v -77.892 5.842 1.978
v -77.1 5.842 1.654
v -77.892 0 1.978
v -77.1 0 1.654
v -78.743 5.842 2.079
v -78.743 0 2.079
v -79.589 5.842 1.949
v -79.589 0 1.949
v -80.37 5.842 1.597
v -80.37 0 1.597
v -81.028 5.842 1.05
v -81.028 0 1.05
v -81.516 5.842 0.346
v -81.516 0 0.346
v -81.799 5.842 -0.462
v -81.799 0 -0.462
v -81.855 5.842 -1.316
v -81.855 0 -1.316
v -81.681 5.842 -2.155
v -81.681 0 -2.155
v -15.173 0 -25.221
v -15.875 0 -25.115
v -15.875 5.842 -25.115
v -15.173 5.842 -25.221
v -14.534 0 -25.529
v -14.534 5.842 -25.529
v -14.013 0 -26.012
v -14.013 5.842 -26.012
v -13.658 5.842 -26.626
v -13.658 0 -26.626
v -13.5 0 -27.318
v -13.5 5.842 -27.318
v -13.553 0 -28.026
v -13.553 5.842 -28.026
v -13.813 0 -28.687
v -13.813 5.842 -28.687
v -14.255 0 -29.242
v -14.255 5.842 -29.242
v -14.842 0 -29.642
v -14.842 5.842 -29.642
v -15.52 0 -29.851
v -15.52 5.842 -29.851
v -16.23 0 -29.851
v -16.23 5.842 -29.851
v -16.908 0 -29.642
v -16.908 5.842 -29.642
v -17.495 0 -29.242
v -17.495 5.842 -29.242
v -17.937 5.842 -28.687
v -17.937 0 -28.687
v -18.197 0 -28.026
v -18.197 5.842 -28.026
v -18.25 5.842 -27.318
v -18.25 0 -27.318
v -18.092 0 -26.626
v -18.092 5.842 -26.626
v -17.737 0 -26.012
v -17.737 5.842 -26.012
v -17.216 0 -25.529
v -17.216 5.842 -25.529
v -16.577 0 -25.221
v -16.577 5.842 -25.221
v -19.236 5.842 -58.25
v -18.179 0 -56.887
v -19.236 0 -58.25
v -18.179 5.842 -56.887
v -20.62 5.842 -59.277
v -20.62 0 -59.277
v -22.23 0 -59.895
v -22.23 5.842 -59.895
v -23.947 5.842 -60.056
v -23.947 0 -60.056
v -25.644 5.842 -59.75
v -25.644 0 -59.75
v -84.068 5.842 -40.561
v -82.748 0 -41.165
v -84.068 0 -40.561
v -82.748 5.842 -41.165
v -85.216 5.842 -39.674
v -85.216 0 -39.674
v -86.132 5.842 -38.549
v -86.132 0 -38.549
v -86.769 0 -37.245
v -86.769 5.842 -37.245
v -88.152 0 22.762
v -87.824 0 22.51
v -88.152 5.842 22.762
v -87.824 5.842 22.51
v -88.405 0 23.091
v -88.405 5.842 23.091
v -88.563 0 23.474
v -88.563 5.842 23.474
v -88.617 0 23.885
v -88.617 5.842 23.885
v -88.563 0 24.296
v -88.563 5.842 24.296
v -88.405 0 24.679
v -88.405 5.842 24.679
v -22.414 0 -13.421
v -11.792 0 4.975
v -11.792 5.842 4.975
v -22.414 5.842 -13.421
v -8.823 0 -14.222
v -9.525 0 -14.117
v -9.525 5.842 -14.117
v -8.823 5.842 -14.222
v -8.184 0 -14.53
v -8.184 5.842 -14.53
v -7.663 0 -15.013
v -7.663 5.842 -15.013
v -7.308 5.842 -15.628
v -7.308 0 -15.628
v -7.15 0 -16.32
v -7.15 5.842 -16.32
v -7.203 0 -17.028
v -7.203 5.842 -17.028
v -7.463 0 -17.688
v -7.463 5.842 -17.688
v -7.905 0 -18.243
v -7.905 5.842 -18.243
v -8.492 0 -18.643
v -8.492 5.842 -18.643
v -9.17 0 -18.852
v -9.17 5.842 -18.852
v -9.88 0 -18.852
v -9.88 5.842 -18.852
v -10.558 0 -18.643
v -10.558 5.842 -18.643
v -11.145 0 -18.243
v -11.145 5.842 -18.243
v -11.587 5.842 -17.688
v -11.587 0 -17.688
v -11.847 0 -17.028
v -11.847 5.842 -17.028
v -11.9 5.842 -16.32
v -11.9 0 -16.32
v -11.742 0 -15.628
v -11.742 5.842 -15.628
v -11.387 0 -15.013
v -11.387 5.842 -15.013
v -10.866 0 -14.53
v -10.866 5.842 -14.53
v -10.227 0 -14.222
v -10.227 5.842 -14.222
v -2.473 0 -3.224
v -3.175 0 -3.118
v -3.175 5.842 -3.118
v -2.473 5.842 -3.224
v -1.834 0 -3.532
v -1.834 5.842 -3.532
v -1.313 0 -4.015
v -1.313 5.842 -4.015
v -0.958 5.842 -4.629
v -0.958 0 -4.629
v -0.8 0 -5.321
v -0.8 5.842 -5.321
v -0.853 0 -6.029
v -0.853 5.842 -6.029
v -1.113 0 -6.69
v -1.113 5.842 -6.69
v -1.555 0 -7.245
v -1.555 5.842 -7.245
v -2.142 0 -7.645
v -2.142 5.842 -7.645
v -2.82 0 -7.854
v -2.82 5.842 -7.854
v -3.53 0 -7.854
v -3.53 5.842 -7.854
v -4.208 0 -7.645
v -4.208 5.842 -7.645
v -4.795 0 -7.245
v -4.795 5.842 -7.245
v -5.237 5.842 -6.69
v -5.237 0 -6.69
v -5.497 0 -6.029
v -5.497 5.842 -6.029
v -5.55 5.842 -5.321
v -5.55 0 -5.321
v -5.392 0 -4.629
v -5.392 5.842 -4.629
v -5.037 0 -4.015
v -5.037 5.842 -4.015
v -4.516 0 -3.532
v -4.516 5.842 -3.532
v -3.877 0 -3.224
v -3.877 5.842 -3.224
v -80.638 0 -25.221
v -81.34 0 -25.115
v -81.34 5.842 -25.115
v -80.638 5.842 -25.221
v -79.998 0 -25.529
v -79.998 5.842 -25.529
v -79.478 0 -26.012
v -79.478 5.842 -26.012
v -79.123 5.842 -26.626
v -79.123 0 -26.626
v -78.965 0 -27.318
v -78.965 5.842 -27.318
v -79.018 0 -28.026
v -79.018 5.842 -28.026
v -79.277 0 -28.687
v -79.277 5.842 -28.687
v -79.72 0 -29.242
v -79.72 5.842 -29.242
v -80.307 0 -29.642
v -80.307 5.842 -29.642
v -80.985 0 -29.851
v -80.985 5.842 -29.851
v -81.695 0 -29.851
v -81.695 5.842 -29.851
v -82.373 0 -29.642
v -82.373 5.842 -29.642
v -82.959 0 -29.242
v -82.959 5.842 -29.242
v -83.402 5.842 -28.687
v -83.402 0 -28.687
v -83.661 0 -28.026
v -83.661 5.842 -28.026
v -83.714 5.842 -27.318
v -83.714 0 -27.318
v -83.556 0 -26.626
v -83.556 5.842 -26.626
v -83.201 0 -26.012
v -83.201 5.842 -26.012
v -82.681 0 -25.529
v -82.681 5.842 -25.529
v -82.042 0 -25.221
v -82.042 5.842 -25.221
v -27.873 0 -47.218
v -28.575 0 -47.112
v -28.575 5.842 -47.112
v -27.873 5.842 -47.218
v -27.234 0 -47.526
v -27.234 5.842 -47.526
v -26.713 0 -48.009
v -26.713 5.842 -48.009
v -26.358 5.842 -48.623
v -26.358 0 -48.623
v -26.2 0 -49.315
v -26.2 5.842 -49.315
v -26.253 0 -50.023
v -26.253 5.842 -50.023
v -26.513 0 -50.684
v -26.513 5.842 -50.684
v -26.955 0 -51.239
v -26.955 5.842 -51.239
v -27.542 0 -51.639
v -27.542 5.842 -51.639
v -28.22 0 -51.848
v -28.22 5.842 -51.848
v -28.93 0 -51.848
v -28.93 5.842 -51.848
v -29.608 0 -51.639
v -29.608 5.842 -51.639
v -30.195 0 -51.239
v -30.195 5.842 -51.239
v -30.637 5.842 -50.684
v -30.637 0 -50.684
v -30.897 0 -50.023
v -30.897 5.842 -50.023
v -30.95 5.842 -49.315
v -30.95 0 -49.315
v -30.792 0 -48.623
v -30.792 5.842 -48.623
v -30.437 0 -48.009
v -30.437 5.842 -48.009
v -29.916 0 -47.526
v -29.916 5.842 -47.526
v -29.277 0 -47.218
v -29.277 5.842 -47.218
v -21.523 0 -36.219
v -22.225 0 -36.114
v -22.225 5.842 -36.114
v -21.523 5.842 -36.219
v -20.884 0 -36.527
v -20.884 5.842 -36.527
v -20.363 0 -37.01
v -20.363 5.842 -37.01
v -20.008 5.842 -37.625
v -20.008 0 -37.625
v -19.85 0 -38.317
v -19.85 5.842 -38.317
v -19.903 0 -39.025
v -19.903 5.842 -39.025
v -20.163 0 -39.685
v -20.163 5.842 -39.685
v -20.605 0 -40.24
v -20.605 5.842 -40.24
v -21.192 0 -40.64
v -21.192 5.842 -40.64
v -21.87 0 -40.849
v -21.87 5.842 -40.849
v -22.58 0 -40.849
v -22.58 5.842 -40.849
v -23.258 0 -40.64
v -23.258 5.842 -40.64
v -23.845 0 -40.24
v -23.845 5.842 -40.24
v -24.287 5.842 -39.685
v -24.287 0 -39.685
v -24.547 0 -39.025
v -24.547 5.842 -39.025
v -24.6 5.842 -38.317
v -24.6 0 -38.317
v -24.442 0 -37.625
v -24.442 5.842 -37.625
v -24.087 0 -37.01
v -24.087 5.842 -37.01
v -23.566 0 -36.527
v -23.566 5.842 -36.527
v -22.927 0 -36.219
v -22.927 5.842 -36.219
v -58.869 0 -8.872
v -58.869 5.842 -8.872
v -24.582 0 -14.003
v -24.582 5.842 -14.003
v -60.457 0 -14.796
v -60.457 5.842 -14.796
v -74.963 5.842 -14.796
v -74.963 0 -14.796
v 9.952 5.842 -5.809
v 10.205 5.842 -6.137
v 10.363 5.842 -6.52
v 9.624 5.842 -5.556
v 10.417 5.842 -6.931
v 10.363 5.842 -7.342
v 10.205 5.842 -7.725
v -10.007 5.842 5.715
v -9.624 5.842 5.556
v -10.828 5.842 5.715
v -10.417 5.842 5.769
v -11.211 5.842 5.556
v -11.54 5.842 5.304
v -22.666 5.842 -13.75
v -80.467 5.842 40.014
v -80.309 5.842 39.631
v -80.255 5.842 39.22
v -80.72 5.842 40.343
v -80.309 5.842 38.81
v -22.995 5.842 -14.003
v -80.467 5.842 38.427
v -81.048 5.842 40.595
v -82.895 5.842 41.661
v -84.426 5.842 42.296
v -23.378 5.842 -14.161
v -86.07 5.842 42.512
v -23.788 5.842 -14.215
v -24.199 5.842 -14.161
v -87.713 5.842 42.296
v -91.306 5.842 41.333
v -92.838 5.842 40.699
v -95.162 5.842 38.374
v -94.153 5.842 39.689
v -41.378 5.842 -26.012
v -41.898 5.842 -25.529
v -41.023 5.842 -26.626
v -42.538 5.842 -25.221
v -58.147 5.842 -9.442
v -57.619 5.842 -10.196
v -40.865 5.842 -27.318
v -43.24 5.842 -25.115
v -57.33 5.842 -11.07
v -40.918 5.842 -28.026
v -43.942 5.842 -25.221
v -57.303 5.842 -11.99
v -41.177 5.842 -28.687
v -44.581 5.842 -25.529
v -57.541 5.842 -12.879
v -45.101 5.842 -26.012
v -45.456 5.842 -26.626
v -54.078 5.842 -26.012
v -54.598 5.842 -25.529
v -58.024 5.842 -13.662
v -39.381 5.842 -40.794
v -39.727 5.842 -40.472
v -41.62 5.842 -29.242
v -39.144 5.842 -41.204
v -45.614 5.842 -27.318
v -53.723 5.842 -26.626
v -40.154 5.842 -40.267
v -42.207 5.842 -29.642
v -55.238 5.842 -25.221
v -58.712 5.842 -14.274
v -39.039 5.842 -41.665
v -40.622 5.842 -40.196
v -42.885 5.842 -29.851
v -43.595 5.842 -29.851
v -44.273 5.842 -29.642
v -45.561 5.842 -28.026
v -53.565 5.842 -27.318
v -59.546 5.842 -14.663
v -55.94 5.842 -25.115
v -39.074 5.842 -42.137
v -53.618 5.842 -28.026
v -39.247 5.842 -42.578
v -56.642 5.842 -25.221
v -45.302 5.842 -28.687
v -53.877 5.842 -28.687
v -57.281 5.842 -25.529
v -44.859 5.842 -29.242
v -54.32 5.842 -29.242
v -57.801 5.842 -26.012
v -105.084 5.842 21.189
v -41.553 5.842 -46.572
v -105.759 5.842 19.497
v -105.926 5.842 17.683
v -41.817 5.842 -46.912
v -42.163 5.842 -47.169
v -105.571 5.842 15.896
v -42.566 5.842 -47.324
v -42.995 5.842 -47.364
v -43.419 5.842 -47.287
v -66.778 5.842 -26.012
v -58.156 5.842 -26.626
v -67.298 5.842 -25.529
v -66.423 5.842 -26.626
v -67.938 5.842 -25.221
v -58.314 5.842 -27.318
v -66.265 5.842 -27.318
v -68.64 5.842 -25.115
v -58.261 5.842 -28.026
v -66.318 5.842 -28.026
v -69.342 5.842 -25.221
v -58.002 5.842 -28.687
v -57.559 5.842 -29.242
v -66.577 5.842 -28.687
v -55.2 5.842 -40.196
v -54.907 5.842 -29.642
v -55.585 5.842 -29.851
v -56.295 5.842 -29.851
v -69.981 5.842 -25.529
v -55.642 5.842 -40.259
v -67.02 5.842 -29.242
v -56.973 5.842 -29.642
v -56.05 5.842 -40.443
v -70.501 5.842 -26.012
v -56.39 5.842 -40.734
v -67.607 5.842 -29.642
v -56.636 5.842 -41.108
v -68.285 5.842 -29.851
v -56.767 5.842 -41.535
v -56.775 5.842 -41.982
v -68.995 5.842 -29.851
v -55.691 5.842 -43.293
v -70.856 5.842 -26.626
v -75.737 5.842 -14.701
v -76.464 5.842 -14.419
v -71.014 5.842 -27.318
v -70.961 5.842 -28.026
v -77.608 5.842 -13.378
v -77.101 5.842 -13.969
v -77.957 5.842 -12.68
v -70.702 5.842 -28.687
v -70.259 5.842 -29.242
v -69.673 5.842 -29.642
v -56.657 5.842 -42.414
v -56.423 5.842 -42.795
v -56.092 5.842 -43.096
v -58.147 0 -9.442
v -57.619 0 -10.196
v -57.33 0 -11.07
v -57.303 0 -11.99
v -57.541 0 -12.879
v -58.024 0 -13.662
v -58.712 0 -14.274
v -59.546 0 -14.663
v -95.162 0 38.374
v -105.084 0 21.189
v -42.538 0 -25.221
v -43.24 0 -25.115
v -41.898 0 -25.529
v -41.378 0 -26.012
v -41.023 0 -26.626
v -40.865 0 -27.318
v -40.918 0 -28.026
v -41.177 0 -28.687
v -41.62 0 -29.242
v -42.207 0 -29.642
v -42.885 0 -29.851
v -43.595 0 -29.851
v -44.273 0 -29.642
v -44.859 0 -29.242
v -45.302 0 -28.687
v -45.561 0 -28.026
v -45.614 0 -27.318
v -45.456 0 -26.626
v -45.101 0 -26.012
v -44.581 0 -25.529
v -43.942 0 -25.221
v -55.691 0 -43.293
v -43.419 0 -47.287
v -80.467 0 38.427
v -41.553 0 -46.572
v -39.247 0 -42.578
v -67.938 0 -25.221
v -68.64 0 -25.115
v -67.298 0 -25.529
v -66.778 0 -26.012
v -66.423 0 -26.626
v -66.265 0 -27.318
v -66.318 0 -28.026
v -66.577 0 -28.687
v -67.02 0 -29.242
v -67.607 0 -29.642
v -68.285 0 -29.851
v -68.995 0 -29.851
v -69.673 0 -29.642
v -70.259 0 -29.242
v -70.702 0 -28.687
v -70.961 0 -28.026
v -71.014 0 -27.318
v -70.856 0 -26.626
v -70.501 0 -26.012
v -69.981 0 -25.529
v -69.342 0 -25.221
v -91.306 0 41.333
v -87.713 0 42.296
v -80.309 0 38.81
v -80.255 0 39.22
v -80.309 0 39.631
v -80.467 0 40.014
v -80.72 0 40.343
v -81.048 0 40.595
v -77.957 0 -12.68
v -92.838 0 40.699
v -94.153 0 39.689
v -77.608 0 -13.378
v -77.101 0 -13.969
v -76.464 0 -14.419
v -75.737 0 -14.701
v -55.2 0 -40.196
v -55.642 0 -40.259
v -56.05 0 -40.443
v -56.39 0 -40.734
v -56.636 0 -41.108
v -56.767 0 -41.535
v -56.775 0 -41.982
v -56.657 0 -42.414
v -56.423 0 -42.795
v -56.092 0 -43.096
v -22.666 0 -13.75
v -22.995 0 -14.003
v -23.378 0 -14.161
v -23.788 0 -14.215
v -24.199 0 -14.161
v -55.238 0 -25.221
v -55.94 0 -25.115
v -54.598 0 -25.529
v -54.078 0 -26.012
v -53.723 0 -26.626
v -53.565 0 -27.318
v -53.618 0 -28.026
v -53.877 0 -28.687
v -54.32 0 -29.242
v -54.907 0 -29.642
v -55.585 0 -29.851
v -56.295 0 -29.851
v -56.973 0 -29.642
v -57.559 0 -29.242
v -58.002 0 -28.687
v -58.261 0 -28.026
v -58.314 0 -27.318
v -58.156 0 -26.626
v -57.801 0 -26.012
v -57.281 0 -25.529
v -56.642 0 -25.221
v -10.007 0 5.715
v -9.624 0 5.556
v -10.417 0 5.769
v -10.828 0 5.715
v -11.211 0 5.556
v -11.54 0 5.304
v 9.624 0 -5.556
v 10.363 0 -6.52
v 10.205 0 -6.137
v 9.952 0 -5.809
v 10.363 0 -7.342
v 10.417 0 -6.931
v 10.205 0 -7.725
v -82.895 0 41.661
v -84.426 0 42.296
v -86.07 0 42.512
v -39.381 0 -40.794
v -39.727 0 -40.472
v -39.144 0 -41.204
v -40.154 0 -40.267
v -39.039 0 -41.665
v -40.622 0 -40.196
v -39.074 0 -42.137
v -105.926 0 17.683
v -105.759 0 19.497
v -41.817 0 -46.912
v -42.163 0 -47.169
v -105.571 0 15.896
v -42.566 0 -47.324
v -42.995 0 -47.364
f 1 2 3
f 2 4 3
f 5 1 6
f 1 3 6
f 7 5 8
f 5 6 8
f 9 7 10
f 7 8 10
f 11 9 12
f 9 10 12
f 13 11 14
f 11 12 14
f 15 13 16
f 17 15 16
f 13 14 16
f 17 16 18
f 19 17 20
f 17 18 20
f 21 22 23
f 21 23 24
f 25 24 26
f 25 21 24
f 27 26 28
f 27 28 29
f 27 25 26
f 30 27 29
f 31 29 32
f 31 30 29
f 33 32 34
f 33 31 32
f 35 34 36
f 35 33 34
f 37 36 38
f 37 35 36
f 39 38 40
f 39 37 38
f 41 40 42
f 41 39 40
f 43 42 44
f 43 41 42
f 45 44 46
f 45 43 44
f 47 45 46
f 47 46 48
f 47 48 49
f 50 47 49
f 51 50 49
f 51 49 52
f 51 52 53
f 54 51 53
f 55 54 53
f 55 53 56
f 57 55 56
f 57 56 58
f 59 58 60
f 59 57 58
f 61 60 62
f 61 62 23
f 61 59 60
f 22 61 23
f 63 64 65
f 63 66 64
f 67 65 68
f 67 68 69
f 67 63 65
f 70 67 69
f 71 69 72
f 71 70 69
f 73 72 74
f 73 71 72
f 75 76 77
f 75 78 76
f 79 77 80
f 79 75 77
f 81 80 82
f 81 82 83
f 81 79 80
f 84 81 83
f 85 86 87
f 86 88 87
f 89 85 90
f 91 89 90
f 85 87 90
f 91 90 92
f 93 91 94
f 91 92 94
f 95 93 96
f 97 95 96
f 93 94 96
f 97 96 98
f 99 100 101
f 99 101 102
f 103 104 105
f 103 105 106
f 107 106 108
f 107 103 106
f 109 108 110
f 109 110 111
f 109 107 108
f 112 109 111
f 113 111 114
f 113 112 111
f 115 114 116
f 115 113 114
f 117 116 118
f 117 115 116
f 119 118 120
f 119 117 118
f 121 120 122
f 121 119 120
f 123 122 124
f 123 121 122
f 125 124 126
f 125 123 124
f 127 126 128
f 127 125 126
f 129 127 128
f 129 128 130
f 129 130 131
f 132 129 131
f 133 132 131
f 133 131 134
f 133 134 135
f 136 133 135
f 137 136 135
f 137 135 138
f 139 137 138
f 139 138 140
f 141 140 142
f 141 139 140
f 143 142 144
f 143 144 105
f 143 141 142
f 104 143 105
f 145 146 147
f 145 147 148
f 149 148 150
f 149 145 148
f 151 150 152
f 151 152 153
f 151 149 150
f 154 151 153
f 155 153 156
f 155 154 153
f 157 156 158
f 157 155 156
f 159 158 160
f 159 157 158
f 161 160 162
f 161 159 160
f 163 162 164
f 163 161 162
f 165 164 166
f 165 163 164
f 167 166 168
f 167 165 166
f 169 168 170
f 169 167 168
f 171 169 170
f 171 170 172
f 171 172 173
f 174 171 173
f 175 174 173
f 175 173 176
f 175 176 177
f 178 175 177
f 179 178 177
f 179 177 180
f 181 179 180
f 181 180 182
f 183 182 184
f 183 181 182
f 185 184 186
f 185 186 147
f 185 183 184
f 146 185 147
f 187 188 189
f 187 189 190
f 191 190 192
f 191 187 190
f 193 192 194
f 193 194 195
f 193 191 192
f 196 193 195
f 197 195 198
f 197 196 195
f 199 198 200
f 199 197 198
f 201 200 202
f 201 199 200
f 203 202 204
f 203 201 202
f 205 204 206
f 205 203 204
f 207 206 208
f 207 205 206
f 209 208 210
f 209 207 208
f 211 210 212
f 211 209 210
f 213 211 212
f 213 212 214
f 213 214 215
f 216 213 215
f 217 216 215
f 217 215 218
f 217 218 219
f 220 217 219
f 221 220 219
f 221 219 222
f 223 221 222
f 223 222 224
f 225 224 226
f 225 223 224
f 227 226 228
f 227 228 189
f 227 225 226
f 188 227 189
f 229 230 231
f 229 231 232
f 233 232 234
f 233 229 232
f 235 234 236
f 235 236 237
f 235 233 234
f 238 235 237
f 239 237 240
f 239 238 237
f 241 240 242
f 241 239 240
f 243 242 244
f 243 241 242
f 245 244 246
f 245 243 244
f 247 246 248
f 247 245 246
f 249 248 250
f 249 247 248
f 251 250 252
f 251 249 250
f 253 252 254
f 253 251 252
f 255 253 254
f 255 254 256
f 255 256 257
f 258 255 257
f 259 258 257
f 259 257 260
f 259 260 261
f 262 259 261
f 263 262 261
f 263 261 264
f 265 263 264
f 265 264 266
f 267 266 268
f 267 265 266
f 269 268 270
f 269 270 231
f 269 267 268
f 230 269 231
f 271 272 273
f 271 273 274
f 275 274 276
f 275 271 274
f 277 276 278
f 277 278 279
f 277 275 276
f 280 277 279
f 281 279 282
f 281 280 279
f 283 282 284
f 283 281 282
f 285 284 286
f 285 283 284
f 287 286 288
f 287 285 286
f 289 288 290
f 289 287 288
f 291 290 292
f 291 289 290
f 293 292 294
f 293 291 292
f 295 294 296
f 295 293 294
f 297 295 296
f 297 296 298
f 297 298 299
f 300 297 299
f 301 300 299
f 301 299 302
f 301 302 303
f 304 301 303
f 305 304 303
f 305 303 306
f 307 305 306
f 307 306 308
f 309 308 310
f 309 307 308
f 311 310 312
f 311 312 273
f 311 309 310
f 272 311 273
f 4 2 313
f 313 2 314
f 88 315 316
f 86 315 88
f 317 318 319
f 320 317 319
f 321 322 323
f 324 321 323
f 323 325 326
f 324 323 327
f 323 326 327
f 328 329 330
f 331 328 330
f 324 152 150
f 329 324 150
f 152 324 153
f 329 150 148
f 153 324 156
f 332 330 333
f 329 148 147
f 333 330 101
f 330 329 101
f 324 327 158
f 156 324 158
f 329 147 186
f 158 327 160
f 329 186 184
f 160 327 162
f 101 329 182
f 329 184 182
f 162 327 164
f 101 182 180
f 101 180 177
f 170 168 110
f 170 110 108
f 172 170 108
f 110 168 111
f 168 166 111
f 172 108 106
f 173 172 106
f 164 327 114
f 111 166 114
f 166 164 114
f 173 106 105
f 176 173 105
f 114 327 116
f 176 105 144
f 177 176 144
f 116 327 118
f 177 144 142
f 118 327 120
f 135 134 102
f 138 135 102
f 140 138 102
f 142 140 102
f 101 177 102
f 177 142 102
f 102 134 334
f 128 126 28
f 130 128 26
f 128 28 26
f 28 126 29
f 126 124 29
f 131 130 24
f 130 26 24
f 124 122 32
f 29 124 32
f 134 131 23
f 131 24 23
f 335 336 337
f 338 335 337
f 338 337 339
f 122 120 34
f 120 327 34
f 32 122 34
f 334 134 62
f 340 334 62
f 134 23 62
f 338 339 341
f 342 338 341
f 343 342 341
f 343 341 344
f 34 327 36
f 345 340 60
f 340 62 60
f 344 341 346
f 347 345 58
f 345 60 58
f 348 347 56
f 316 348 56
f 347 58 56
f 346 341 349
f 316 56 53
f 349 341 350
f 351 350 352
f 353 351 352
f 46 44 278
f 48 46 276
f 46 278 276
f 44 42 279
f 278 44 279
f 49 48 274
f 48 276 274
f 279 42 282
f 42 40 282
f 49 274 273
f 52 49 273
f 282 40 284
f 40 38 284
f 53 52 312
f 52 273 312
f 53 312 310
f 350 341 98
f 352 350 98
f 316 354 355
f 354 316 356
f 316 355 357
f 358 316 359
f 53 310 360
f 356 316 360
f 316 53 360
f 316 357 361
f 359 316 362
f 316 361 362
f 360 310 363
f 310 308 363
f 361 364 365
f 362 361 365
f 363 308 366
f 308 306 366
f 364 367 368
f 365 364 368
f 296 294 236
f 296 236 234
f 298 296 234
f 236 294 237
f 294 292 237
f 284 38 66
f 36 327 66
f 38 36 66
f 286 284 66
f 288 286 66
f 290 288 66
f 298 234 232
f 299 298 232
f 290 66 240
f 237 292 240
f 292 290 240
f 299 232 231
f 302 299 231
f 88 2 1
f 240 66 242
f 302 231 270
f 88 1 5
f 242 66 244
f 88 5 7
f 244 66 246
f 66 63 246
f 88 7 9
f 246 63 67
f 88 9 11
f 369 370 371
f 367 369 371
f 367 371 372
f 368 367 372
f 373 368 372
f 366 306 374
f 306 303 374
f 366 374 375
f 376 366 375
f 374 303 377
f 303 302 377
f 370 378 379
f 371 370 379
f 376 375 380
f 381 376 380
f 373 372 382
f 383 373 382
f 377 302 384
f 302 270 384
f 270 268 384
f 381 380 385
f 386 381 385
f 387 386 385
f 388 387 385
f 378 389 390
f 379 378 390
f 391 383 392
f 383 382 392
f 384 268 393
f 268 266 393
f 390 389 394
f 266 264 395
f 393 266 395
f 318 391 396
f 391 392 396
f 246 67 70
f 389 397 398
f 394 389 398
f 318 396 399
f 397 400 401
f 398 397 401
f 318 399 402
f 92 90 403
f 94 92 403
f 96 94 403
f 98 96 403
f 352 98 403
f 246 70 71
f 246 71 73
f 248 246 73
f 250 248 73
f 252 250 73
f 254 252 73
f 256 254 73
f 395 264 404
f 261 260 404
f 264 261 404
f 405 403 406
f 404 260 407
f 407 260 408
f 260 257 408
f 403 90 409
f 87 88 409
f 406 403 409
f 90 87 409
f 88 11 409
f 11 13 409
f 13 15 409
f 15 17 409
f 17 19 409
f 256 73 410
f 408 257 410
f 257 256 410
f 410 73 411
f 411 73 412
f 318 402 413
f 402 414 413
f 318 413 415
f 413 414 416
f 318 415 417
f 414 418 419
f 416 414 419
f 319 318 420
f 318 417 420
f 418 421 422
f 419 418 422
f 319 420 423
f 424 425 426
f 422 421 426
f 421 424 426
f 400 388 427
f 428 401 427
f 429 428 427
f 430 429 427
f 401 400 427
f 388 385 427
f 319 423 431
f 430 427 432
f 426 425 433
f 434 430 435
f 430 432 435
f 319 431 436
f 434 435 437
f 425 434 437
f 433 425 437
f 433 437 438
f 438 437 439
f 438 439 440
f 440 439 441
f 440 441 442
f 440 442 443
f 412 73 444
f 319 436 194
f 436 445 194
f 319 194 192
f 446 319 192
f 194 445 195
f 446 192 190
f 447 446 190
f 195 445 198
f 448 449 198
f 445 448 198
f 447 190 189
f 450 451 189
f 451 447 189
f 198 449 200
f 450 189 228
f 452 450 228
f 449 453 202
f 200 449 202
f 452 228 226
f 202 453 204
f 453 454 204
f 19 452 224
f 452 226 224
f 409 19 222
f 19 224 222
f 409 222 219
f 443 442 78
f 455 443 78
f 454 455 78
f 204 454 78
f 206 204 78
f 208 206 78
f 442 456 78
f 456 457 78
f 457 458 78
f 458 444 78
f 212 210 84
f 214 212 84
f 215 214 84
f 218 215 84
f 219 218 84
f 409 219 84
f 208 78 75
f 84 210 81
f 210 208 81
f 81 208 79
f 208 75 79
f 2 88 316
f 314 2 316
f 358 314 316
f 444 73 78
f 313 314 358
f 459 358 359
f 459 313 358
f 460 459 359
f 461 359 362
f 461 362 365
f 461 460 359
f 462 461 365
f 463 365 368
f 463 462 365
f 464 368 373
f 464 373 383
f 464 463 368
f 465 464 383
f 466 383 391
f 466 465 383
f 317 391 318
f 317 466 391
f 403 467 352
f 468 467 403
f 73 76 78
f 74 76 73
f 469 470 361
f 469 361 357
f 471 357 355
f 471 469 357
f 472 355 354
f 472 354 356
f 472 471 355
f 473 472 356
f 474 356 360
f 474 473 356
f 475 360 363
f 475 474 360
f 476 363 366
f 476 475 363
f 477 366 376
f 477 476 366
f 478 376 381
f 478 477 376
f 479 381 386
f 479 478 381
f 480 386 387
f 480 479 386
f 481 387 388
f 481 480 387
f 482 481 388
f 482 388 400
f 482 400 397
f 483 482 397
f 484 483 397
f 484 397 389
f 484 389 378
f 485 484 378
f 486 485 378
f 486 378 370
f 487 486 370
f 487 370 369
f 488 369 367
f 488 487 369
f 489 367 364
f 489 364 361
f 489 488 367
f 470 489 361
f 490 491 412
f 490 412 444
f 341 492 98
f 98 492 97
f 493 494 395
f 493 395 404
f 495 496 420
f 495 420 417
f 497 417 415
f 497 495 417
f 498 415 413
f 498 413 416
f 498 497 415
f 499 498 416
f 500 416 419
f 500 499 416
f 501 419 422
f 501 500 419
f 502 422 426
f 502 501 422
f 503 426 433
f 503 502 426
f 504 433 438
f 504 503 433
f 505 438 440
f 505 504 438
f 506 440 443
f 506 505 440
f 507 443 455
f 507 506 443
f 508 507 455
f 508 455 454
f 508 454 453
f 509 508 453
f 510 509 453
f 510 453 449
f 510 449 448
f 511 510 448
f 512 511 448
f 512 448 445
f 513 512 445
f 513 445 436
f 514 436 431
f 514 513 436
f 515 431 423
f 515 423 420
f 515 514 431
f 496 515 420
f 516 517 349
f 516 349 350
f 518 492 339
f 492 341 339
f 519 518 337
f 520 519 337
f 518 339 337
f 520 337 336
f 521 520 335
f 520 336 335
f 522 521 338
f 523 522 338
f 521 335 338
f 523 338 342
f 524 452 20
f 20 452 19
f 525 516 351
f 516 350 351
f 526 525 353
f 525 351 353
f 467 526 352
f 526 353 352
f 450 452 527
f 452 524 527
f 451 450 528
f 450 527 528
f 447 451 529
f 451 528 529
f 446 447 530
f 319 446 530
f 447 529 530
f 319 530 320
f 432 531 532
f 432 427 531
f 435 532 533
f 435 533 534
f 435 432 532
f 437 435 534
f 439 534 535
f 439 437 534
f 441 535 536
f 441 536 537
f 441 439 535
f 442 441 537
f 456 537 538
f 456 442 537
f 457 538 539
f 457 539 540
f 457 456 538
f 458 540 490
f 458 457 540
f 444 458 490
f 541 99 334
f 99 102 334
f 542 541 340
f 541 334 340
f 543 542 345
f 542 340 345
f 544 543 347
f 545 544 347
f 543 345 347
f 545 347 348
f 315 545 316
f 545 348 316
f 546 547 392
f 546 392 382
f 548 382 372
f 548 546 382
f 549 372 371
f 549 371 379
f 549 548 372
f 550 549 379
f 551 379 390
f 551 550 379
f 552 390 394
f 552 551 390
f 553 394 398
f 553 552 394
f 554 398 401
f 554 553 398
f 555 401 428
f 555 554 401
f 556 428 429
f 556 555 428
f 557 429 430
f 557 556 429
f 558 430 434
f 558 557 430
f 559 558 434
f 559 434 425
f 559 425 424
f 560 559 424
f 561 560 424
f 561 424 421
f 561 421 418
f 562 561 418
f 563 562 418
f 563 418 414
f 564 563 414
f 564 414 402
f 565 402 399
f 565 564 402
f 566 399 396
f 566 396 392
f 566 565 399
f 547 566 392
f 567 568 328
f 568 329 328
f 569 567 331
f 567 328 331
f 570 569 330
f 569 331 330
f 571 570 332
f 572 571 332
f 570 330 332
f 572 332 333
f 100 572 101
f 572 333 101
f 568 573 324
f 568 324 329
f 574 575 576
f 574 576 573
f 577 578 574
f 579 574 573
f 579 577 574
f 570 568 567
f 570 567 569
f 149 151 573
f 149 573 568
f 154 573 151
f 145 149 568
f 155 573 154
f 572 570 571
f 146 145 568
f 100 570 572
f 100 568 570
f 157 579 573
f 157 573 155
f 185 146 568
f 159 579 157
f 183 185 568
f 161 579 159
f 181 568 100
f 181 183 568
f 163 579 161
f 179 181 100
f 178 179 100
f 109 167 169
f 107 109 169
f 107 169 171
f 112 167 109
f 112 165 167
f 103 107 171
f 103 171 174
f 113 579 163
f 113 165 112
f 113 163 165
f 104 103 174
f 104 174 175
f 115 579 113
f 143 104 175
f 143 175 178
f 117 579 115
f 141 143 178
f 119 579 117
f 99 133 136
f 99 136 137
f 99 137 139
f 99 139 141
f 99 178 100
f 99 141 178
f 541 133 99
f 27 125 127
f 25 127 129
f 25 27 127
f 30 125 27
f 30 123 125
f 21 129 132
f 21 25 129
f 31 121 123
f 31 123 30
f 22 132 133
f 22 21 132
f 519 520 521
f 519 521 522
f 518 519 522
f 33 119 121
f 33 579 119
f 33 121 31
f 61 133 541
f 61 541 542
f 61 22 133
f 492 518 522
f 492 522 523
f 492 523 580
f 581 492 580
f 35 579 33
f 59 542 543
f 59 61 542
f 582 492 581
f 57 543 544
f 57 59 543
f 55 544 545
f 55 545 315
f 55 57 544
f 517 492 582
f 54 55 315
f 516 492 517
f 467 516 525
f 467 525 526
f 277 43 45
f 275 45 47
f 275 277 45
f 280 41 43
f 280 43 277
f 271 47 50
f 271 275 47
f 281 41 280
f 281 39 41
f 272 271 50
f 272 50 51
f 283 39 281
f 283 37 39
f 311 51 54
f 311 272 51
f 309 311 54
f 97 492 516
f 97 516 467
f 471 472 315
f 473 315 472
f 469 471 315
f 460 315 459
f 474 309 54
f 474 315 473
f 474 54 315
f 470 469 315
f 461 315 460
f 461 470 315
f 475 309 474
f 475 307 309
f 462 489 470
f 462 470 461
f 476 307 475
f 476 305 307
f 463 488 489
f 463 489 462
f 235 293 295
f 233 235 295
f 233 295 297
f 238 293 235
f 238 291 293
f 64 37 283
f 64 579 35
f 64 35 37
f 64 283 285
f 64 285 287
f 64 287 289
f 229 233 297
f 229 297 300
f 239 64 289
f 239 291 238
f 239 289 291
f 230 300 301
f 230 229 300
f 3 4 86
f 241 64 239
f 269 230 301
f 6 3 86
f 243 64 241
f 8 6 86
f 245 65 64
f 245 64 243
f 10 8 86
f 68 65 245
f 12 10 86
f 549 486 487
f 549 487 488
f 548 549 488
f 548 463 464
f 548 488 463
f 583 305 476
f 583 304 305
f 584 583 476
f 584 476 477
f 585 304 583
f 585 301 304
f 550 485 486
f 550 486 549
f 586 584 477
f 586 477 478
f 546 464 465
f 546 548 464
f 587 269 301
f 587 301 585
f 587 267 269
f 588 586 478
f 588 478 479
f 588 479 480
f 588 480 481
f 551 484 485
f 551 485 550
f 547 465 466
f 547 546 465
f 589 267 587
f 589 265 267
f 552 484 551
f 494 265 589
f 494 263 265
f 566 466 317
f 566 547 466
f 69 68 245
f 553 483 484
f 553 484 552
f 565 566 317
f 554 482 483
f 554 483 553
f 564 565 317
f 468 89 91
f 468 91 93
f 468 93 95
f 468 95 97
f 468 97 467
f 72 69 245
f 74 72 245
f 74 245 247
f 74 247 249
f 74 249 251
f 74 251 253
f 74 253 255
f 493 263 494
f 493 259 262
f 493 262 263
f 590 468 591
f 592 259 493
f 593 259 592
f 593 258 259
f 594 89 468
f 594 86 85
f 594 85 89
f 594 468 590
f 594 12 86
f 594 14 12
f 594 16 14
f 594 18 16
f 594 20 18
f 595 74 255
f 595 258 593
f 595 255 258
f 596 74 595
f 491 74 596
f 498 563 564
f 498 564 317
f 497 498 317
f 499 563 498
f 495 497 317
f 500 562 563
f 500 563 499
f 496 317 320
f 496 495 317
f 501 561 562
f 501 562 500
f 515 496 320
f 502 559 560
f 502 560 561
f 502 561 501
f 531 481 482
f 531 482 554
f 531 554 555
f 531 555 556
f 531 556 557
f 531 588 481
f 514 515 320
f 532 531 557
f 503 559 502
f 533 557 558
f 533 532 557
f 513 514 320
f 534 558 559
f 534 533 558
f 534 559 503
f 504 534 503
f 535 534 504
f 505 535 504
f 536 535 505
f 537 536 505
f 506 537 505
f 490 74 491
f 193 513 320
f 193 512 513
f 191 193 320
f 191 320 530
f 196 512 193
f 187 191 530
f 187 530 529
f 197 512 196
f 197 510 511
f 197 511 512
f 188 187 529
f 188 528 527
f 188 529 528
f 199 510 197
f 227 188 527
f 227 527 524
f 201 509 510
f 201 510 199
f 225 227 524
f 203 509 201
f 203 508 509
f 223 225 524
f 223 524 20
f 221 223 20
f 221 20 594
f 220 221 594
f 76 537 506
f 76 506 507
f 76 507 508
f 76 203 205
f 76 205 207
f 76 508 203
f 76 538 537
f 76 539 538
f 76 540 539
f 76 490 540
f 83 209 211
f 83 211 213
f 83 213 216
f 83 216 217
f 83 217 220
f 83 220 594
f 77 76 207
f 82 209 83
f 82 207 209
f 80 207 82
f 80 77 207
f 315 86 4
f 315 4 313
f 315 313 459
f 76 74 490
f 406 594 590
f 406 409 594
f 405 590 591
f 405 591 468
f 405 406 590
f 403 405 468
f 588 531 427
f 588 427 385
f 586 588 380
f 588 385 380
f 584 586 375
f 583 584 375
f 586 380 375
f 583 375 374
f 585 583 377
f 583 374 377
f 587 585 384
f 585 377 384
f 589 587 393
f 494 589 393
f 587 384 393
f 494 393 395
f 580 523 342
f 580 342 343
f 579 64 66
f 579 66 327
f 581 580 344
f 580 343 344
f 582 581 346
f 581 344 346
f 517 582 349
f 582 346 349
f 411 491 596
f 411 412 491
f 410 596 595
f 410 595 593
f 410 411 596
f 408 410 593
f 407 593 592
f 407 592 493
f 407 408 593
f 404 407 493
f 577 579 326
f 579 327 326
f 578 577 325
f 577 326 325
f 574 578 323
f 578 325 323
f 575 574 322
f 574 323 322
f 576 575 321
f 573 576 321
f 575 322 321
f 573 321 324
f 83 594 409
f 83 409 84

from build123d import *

# Parameters (mm, degrees)
SKETCH1_R           = 2.38125
BOSS_EXTRUDE1_DEPTH = 5.842
FILLET1_R           = 1.5875
FILLET2_R           = 6.35
FILLET3_R           = 1.5875
CUT_EXTRUDE1_DEPTH  = 122.916897323
FILLET4_R           = 3.175


with BuildPart() as part:
    # Sketch1 → Boss-Extrude1 (new body)
    with BuildSketch(Plane(origin=(0, 0, 0), x_dir=(1, 0, 0), z_dir=(0, 1, 0))):
        Polygon((-10.998522628, -6.35), (-23.207348419, 14.79630657), (-89.198484187, -23.30369343), (-82.848484187, -34.302216058), (-79.673484187, -39.801477372), (-85.172745501, -42.976477372), (-93.847006815, -40.652216058), (-106.547006815, -18.655170802), (-85.725, 40.19630657), (-20.751477372, 61.34261314), (10.998522628, 6.35), align=None)
        with Locations(Location((-28.575, 49.493351826, 0), (0, 0, 270))):
            Circle(SKETCH1_R, mode=Mode.SUBTRACT)
        with Locations(Location((-22.225, 38.494829198, 0), (0, 0, 270))):
            Circle(SKETCH1_R, mode=Mode.SUBTRACT)
        with Locations(Location((-15.875, 27.49630657, 0), (0, 0, 270))):
            Circle(SKETCH1_R, mode=Mode.SUBTRACT)
        with Locations(Location((-9.525, 16.497783942, 0), (0, 0, 270))):
            Circle(SKETCH1_R, mode=Mode.SUBTRACT)
        with Locations(Location((-3.175, 5.499261314, 0), (0, 0, 270))):
            Circle(SKETCH1_R, mode=Mode.SUBTRACT)
        with Locations(Location((-43.2397154, 27.49630657, 0), (0, 0, 270))):
            Circle(SKETCH1_R, mode=Mode.SUBTRACT)
        with Locations(Location((-55.9397154, 27.49630657, 0), (0, 0, 270))):
            Circle(SKETCH1_R, mode=Mode.SUBTRACT)
        with Locations(Location((-68.6397154, 27.49630657, 0), (0, 0, 270))):
            Circle(SKETCH1_R, mode=Mode.SUBTRACT)
        with Locations(Location((-81.3397154, 27.49630657, 0), (0, 0, 270))):
            Circle(SKETCH1_R, mode=Mode.SUBTRACT)
        Polygon((-37.872045256, 40.19630657), (-42.195906773, 47.685454402), (-65.206843197, 40.19630657), align=None, mode=Mode.SUBTRACT)
    extrude(amount=BOSS_EXTRUDE1_DEPTH)

    # Fillet1
    fillet1_edges = [part.edges().sort_by_distance(p)[0] for p in [
        (-42.195906773, 2.921, -47.685454402),
        (-65.206843197, 2.921, -40.19630657),
        (-37.872045256, 2.921, -40.19630657),
    ]]
    fillet(fillet1_edges, radius=FILLET1_R)

    # Fillet2
    fillet2_edges = [part.edges().sort_by_distance(p)[0] for p in [
        (-85.725, 2.921, -40.19630657),
        (-20.751477372, 2.921, -61.34261314),
        (-85.172745501, 2.921, 42.976477372),
        (-93.847006815, 2.921, 40.652216058),
        (-106.547006815, 2.921, 18.655170802),
    ]]
    fillet(fillet2_edges, radius=FILLET2_R)

    # Fillet3
    fillet3_edges = [part.edges().sort_by_distance(p)[0] for p in [
        (10.998522628, 2.921, -6.35),
        (-10.998522628, 2.921, 6.35),
        (-23.207348419, 2.921, -14.79630657),
        (-89.198484187, 2.921, 23.30369343),
        (-79.673484187, 2.921, 39.801477372),
    ]]
    fillet(fillet3_edges, radius=FILLET3_R)

    # Sketch2 → Cut-Extrude1 (cut, through all)
    with BuildSketch(Plane(origin=(0, 5.842, 0), x_dir=(1, 0, 0), z_dir=(0, 1, 0))):
        Polygon((-84.549961559, -5.955170802), (-48.607348419, 14.79630657), (-77.207963999, 14.79630657), align=None)
    extrude(amount=-CUT_EXTRUDE1_DEPTH, mode=Mode.SUBTRACT)

    # Fillet4
    fillet4_edges = [part.edges().sort_by_distance(p)[0] for p in [
        (-84.549961559, 2.921, 5.955170802),
        (-77.207963999, 2.921, -14.79630657),
        (-48.607348419, 2.921, -14.79630657),
    ]]
    fillet(fillet4_edges, radius=FILLET4_R)


solid = part.part
